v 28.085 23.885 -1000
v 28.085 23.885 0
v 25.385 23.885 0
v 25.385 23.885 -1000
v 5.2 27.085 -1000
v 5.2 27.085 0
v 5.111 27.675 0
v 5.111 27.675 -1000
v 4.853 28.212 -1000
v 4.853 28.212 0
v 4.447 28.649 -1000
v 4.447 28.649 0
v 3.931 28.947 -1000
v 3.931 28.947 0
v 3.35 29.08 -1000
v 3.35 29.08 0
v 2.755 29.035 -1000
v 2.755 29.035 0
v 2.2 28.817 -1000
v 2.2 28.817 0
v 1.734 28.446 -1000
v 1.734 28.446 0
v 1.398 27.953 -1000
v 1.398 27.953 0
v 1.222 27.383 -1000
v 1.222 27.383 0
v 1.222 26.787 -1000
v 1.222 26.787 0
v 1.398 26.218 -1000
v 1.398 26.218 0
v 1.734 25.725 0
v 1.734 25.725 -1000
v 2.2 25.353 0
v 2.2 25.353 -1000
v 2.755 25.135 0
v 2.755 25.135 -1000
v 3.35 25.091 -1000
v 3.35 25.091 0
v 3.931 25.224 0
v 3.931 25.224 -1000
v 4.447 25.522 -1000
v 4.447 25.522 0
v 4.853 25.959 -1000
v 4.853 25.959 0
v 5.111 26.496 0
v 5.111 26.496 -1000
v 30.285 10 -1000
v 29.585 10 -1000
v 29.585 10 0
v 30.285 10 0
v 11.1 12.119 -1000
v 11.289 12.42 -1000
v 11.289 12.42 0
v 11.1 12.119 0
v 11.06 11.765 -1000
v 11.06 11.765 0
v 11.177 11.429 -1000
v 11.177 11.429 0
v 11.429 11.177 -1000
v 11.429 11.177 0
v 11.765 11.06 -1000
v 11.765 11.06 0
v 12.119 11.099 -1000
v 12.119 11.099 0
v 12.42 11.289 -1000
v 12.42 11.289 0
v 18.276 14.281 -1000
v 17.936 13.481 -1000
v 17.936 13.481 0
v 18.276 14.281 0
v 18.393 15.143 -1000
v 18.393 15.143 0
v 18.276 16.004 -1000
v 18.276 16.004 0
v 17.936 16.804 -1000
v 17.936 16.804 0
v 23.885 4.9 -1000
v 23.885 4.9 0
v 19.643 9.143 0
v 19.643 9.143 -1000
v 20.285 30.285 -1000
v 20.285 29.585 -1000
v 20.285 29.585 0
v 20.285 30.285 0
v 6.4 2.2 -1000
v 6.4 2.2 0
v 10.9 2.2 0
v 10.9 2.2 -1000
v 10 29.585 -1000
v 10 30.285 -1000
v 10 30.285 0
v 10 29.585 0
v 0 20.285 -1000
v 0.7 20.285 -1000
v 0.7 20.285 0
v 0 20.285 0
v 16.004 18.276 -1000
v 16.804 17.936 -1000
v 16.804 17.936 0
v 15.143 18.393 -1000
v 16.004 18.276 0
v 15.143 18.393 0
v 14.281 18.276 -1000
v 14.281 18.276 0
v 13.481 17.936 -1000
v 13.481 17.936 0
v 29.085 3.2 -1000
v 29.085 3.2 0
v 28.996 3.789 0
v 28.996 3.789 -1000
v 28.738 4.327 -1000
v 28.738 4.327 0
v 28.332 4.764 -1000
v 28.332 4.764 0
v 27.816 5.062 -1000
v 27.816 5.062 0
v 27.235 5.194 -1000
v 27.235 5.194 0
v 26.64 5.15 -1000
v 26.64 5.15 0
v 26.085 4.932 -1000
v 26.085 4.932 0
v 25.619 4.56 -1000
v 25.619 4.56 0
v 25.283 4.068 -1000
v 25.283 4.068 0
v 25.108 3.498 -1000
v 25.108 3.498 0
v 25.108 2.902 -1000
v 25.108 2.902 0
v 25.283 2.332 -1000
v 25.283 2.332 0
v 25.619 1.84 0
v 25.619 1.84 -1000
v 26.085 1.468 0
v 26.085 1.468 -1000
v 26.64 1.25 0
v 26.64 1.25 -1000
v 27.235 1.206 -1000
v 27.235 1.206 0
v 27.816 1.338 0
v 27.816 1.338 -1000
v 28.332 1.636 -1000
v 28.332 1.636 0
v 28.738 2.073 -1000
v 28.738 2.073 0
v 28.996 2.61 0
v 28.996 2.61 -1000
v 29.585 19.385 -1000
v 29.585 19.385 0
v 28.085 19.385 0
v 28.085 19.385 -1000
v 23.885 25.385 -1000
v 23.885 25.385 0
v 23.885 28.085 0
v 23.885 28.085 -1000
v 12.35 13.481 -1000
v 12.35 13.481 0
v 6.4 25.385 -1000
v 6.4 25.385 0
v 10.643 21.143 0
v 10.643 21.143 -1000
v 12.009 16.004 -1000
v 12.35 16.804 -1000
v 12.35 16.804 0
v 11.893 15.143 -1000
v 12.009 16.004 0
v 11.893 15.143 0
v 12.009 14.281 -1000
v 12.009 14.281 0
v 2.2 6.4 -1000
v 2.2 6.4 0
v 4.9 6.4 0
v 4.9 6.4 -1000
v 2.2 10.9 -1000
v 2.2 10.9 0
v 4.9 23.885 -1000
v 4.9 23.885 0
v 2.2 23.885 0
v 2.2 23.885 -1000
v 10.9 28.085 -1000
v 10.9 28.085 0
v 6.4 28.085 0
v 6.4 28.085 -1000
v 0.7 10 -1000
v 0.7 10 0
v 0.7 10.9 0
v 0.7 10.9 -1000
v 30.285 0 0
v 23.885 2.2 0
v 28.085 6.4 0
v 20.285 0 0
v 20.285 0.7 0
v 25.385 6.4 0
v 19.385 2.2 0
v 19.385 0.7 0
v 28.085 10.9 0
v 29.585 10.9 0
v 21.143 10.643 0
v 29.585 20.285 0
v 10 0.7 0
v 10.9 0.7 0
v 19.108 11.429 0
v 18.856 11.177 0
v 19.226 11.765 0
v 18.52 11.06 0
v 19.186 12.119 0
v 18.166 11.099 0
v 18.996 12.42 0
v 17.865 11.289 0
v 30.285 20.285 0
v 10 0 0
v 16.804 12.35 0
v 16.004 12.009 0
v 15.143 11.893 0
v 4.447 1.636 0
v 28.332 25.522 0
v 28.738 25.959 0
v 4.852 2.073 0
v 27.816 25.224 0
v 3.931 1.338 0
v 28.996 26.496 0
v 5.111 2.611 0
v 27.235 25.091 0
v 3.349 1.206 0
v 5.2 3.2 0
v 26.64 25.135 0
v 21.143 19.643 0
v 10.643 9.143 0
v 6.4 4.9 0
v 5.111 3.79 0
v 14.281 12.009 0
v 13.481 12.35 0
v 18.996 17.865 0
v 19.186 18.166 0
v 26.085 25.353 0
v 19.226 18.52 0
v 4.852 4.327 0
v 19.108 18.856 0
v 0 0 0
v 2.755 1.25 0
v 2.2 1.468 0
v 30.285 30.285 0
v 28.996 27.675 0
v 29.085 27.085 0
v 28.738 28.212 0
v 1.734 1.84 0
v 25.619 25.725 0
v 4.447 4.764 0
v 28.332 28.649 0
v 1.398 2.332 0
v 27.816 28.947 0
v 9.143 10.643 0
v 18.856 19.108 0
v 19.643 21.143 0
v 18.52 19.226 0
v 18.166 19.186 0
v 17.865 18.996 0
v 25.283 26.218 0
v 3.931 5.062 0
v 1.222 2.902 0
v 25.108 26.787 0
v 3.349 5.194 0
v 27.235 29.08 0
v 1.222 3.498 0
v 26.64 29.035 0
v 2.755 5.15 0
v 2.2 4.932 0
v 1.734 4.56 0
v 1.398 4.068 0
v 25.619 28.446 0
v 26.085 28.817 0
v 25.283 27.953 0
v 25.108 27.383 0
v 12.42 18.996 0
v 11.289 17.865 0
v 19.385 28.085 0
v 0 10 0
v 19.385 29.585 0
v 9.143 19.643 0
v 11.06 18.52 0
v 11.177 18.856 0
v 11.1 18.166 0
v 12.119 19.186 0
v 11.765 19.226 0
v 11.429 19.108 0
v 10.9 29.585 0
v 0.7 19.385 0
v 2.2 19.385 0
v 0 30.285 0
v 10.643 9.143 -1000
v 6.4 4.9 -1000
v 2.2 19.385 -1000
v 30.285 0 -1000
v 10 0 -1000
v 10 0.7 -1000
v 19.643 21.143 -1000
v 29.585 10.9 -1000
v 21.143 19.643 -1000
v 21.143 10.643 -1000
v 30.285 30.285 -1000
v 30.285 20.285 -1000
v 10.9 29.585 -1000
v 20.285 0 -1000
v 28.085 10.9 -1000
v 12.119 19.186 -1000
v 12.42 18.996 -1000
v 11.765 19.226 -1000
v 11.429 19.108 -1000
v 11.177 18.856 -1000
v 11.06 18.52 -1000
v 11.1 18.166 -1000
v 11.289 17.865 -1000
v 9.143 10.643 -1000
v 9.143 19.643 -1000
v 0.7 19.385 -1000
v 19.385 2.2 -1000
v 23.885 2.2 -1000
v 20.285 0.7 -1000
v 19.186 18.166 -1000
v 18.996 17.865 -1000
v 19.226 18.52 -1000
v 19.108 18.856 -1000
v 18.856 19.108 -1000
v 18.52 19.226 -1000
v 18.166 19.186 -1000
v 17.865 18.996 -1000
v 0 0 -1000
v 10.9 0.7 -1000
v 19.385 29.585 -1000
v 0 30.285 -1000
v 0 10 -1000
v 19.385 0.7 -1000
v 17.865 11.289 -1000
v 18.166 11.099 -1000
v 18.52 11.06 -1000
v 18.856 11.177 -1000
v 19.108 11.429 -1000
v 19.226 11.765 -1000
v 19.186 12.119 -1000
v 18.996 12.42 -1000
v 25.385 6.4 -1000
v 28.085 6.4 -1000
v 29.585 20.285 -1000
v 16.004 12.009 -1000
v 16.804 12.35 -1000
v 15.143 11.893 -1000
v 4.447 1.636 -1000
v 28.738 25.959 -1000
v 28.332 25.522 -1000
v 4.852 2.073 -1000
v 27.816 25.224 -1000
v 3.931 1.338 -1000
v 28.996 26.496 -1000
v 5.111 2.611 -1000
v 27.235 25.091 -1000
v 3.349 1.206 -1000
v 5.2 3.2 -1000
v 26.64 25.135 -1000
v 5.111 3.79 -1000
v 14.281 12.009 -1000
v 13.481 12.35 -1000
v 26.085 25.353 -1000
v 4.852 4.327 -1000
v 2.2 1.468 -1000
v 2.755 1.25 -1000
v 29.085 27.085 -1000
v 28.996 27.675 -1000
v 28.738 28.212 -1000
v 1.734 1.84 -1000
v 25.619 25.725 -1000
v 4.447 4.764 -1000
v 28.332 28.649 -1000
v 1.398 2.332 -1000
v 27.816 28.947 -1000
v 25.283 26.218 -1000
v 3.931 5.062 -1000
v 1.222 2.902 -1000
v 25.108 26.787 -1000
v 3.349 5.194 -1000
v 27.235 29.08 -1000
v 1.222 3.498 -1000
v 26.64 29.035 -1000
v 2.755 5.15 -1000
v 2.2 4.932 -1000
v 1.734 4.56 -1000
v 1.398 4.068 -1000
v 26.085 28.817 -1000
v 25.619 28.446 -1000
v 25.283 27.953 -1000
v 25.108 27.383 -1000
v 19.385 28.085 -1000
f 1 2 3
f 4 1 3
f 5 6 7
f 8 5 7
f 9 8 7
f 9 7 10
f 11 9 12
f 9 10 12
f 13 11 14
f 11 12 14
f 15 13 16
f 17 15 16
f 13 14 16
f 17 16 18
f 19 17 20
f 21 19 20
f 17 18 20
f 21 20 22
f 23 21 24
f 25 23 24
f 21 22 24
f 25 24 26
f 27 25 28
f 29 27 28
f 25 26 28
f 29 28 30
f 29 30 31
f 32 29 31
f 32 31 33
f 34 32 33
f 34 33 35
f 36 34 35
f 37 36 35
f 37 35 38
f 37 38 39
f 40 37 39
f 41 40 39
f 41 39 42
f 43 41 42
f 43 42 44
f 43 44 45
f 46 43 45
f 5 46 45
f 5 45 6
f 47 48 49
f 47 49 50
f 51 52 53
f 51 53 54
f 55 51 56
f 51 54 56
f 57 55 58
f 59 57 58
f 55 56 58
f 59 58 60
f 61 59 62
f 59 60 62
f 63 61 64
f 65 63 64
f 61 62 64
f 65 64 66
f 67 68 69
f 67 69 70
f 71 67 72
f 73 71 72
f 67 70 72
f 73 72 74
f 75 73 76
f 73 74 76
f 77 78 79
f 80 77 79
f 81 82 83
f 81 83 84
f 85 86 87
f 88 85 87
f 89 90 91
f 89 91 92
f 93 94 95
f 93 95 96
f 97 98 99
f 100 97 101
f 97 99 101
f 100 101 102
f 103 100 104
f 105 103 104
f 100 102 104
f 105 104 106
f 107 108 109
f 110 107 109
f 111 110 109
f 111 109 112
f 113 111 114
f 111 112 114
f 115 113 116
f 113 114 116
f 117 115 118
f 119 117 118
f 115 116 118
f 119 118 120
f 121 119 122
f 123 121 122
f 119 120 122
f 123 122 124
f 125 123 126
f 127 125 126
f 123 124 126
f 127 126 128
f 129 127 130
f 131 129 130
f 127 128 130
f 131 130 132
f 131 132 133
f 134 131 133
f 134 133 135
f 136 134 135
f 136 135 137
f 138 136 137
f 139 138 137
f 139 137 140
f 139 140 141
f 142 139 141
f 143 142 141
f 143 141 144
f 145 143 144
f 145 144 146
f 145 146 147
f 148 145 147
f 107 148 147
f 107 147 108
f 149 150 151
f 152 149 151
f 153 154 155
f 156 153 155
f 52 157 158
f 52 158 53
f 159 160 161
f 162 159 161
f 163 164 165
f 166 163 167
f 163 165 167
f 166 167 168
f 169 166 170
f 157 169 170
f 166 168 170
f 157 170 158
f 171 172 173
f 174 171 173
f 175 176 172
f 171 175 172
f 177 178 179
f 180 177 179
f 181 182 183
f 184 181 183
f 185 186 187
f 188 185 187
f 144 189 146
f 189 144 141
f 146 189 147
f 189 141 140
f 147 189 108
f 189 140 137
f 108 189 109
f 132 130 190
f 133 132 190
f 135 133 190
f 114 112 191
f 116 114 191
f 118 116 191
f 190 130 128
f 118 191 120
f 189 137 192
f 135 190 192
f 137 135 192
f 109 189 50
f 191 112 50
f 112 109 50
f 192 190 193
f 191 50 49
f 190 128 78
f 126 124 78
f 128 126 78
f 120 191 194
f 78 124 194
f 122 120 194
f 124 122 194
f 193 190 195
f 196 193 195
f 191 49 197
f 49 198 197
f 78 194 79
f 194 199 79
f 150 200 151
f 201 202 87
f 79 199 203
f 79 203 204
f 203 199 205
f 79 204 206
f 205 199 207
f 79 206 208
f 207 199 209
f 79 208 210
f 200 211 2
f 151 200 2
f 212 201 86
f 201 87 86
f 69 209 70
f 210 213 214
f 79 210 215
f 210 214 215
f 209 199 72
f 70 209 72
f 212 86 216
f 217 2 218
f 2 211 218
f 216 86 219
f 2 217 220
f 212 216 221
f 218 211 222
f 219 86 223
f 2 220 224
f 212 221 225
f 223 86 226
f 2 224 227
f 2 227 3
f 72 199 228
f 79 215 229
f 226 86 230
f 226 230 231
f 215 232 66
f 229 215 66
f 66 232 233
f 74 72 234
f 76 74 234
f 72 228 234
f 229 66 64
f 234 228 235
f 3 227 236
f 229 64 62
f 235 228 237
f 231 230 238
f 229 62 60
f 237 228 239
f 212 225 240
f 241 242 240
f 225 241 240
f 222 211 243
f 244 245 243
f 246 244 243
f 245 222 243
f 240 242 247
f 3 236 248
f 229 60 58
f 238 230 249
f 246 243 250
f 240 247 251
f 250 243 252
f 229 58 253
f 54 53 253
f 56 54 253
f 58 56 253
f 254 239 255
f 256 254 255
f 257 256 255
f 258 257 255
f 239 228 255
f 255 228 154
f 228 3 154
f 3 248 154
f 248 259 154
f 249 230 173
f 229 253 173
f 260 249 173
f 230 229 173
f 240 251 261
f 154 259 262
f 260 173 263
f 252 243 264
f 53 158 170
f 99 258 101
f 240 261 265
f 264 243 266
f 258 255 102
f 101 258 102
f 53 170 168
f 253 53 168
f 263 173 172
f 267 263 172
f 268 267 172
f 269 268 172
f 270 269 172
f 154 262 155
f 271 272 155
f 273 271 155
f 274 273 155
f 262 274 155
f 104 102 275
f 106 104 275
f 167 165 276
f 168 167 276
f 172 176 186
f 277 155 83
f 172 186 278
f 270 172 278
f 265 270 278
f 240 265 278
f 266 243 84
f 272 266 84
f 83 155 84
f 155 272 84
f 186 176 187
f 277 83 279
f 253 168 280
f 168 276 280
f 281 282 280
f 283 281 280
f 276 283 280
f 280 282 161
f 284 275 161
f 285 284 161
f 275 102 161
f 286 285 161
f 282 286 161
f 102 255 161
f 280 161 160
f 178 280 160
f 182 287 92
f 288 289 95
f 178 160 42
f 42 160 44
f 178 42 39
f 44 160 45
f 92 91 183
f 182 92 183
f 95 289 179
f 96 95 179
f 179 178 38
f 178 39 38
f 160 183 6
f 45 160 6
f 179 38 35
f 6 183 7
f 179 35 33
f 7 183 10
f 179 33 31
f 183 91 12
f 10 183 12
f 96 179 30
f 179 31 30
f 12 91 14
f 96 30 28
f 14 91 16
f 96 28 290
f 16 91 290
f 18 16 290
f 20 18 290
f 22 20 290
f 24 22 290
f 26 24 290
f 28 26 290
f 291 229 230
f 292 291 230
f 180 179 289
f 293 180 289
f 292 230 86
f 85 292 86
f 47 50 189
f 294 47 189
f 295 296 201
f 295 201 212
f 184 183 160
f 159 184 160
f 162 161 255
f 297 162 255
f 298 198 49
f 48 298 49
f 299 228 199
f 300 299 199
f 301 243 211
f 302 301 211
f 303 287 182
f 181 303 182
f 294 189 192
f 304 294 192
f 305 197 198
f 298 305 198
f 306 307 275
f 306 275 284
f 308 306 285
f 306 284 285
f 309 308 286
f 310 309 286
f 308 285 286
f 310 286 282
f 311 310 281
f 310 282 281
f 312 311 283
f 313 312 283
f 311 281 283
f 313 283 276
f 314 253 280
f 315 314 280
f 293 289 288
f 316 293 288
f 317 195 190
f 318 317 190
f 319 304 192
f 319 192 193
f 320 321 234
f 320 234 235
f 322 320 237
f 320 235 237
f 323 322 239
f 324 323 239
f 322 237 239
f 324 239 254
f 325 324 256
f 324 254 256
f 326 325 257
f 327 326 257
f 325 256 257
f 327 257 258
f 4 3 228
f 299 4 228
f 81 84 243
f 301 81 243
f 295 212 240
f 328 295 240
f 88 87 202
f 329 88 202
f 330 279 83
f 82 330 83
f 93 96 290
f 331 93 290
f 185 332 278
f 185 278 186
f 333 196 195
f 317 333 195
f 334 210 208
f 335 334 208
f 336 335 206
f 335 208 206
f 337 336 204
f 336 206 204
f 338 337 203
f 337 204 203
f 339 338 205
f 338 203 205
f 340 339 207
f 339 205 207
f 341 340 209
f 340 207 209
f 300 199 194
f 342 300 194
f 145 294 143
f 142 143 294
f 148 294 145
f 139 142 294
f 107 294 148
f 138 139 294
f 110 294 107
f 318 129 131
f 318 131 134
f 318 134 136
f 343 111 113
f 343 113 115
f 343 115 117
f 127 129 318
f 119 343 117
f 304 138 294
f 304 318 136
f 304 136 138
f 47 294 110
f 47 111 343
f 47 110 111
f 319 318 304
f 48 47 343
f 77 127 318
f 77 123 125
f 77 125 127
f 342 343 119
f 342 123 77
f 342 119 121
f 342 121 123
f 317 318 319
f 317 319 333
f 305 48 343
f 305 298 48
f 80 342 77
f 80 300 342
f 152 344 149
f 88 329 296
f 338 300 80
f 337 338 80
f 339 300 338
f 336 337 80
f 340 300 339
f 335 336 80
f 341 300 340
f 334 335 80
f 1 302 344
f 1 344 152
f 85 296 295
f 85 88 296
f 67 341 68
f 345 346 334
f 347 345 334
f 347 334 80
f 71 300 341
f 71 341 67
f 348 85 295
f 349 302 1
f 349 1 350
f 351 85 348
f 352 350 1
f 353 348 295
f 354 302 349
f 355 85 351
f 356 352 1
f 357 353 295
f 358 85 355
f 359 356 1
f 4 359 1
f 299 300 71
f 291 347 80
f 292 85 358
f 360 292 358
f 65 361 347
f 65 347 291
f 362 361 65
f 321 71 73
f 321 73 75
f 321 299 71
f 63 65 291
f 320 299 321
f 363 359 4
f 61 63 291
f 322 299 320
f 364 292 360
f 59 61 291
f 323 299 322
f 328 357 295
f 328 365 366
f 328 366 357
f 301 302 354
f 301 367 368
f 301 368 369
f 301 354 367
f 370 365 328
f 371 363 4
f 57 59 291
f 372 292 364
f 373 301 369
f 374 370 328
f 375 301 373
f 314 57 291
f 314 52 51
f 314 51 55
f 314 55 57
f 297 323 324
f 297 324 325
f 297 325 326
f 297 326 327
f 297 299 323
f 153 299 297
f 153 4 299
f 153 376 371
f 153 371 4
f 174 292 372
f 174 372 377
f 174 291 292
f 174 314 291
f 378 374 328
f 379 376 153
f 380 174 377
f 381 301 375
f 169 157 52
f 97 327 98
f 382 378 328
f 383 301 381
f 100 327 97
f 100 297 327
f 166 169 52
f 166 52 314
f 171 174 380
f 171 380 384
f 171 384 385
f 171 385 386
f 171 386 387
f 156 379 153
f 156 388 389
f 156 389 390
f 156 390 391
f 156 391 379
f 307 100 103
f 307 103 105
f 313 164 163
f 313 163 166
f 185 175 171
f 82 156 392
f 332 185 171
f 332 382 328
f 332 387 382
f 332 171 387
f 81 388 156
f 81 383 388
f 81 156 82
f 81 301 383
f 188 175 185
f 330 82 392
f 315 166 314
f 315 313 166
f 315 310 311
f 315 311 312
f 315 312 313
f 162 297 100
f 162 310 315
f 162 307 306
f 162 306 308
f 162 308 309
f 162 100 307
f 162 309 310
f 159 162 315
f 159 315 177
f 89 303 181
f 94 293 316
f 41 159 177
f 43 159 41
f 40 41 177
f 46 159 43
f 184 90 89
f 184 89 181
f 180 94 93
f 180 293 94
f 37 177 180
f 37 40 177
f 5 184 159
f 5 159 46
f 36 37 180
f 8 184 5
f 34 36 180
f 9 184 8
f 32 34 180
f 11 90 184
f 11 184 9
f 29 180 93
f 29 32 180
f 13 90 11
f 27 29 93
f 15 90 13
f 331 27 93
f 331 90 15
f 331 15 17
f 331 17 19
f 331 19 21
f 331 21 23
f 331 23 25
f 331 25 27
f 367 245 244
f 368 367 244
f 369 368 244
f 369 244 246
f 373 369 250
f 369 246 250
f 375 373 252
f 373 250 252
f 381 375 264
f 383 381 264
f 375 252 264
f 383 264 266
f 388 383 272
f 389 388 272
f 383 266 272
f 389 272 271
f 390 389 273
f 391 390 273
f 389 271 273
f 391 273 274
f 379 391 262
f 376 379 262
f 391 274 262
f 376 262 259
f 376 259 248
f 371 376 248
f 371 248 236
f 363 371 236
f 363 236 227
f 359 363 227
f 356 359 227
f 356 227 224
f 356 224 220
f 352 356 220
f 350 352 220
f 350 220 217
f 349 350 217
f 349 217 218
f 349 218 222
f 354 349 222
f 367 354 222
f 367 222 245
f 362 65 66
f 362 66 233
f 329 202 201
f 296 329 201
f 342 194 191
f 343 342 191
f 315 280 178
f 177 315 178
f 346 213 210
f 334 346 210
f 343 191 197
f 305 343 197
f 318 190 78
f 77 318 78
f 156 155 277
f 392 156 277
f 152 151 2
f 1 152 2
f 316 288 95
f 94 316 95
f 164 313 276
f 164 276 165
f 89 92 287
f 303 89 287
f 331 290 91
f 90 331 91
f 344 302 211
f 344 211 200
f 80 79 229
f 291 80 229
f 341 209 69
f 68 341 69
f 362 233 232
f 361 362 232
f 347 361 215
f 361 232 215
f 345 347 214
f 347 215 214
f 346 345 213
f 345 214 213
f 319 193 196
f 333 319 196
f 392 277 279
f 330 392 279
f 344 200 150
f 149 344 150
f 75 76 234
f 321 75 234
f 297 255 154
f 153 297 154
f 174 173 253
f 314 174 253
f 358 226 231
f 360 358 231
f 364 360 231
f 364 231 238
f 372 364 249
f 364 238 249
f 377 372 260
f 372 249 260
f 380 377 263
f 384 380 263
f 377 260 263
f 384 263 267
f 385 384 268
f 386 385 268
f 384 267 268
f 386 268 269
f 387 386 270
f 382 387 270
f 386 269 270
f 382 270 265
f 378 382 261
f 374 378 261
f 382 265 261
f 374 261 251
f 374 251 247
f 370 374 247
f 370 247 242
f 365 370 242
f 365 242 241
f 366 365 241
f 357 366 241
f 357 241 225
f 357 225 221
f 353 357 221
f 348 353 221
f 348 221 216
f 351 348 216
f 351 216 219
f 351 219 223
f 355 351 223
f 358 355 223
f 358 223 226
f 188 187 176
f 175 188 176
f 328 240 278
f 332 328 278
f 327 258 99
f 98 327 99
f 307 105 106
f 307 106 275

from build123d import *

# Parameters (mm, degrees)
BOSS_EXTRUDE2_DEPTH = 1000
CUT_EXTRUDE1_REACH  = 1002
SKETCH3_R           = 2
SKETCH3_R_2         = 1.999999992


with BuildPart() as part:
    # Sketch2 → Boss-Extrude2 (new body)
    with BuildSketch(Plane.XY):
        Polygon((0, 0), (0, 10), (0.7, 10), (0.7, 10.9), (2.2, 10.9), (2.2, 6.4), (4.9, 6.4), (9.142640687, 10.642640687), (9.142640687, 19.642640687), (4.9, 23.885281374), (2.2, 23.885281374), (2.2, 19.385281374), (0.7, 19.385281374), (0.7, 20.285281374), (0, 20.285281374), (0, 30.285281374), (10, 30.285281374), (10, 29.585281374), (10.9, 29.585281374), (10.9, 28.085281374), (6.4, 28.085281374), (6.4, 25.385281374), (10.642640687, 21.142640687), (19.642640687, 21.142640687), (23.885281374, 25.385281374), (23.885281374, 28.085281374), (19.385281374, 28.085281374), (19.385281374, 29.585281374), (20.285281374, 29.585281374), (20.285281374, 30.285281374), (30.285281374, 30.285281374), (30.285281374, 20.285281374), (29.585281374, 20.285281374), (29.585281374, 19.385281374), (28.085281374, 19.385281374), (28.085281374, 23.885281374), (25.385281374, 23.885281374), (21.142640687, 19.642640687), (21.142640687, 10.642640687), (25.385281374, 6.4), (28.085281374, 6.4), (28.085281374, 10.9), (29.585281374, 10.9), (29.585281374, 10), (30.285281374, 10), (30.285281374, 0), (20.285281374, 0), (20.285281374, 0.7), (19.385281374, 0.7), (19.385281374, 2.2), (23.885281374, 2.2), (23.885281374, 4.9), (19.642640687, 9.142640687), (10.642640687, 9.142640687), (6.4, 4.9), (6.4, 2.2), (10.9, 2.2), (10.9, 0.7), (10, 0.7), (10, 0), align=None)
    extrude(amount=-BOSS_EXTRUDE2_DEPTH)

    # Sketch3 → Cut-Extrude1 (cut, up to next)
    with BuildSketch(Plane.XY, mode=Mode.PRIVATE) as cut_extrude1_sk1:
        with Locations((3.200056686, 27.085348905)):
            Circle(SKETCH3_R)
    cut_extrude1_tool1 = extrude(cut_extrude1_sk1.sketch, amount=-CUT_EXTRUDE1_REACH, mode=Mode.PRIVATE) & part.part
    add(cut_extrude1_tool1.solids().sort_by_distance((3.200057, 27.085349, 0))[0], mode=Mode.SUBTRACT)
    # Sketch3 → Cut-Extrude1 (cut, up to next)
    with BuildSketch(Plane.XY, mode=Mode.PRIVATE) as cut_extrude1_sk2:
        with Locations((27.085224689, 27.085348905)):
            Circle(SKETCH3_R)
    cut_extrude1_tool2 = extrude(cut_extrude1_sk2.sketch, amount=-CUT_EXTRUDE1_REACH, mode=Mode.PRIVATE) & part.part
    add(cut_extrude1_tool2.solids().sort_by_distance((27.085225, 27.085349, 0))[0], mode=Mode.SUBTRACT)
    # Sketch3 → Cut-Extrude1 (cut, up to next)
    with BuildSketch(Plane.XY, mode=Mode.PRIVATE) as cut_extrude1_sk3:
        with Locations((27.085224689, 3.19993247)):
            Circle(SKETCH3_R)
    cut_extrude1_tool3 = extrude(cut_extrude1_sk3.sketch, amount=-CUT_EXTRUDE1_REACH, mode=Mode.PRIVATE) & part.part
    add(cut_extrude1_tool3.solids().sort_by_distance((27.085225, 3.199932, 0))[0], mode=Mode.SUBTRACT)
    # Sketch3 → Cut-Extrude1 (cut, up to next)
    with BuildSketch(Plane.XY, mode=Mode.PRIVATE) as cut_extrude1_sk4:
        with Locations((3.19993247, 3.200056686)):
            Circle(SKETCH3_R_2)
    cut_extrude1_tool4 = extrude(cut_extrude1_sk4.sketch, amount=-CUT_EXTRUDE1_REACH, mode=Mode.PRIVATE) & part.part
    add(cut_extrude1_tool4.solids().sort_by_distance((3.199932, 3.200057, 0))[0], mode=Mode.SUBTRACT)
    # Sketch3 → Cut-Extrude1 (cut, up to next)
    with BuildSketch(Plane.XY, mode=Mode.PRIVATE) as cut_extrude1_sk5:
        with BuildLine():
            Line((11.288922887, 17.865021836), (12.349577543, 16.804356148))
            ThreePointArc((12.349577543, 16.804356148), (11.892640687, 15.142640687), (12.349577543, 13.480925226))
            Line((12.349577543, 13.480925226), (11.288922887, 12.420259538))
            ThreePointArc((11.288922887, 12.420259538), (11.288928771, 11.288888688), (12.420299621, 11.288894572))
            Line((12.420299621, 11.288894572), (13.480954277, 12.34956026))
            ThreePointArc((13.480954277, 12.34956026), (15.142640687, 11.892640687), (16.804327097, 12.34956026))
            Line((16.804327097, 12.34956026), (17.864981753, 11.288894572))
            ThreePointArc((17.864981753, 11.288894572), (18.996352603, 11.288888688), (18.996358487, 12.420259538))
            Line((18.996358487, 12.420259538), (17.935703831, 13.480925226))
            ThreePointArc((17.935703831, 13.480925226), (18.392640687, 15.142640687), (17.935703831, 16.804356148))
            Line((17.935703831, 16.804356148), (18.996358487, 17.865021836))
            ThreePointArc((18.996358487, 17.865021836), (18.996352603, 18.996392686), (17.864981753, 18.996386802))
            Line((17.864981753, 18.996386802), (16.804327097, 17.935721114))
            ThreePointArc((16.804327097, 17.935721114), (15.142640687, 18.392640687), (13.480954277, 17.935721114))
            Line((13.480954277, 17.935721114), (12.420299621, 18.996386802))
            ThreePointArc((12.420299621, 18.996386802), (11.288928771, 18.996392686), (11.288922887, 17.865021836))
        make_face()
    cut_extrude1_tool5 = extrude(cut_extrude1_sk5.sketch, amount=-CUT_EXTRUDE1_REACH, mode=Mode.PRIVATE) & part.part
    add(cut_extrude1_tool5.solids().sort_by_distance((15.142641, 15.142641, 0))[0], mode=Mode.SUBTRACT)


solid = part.part
